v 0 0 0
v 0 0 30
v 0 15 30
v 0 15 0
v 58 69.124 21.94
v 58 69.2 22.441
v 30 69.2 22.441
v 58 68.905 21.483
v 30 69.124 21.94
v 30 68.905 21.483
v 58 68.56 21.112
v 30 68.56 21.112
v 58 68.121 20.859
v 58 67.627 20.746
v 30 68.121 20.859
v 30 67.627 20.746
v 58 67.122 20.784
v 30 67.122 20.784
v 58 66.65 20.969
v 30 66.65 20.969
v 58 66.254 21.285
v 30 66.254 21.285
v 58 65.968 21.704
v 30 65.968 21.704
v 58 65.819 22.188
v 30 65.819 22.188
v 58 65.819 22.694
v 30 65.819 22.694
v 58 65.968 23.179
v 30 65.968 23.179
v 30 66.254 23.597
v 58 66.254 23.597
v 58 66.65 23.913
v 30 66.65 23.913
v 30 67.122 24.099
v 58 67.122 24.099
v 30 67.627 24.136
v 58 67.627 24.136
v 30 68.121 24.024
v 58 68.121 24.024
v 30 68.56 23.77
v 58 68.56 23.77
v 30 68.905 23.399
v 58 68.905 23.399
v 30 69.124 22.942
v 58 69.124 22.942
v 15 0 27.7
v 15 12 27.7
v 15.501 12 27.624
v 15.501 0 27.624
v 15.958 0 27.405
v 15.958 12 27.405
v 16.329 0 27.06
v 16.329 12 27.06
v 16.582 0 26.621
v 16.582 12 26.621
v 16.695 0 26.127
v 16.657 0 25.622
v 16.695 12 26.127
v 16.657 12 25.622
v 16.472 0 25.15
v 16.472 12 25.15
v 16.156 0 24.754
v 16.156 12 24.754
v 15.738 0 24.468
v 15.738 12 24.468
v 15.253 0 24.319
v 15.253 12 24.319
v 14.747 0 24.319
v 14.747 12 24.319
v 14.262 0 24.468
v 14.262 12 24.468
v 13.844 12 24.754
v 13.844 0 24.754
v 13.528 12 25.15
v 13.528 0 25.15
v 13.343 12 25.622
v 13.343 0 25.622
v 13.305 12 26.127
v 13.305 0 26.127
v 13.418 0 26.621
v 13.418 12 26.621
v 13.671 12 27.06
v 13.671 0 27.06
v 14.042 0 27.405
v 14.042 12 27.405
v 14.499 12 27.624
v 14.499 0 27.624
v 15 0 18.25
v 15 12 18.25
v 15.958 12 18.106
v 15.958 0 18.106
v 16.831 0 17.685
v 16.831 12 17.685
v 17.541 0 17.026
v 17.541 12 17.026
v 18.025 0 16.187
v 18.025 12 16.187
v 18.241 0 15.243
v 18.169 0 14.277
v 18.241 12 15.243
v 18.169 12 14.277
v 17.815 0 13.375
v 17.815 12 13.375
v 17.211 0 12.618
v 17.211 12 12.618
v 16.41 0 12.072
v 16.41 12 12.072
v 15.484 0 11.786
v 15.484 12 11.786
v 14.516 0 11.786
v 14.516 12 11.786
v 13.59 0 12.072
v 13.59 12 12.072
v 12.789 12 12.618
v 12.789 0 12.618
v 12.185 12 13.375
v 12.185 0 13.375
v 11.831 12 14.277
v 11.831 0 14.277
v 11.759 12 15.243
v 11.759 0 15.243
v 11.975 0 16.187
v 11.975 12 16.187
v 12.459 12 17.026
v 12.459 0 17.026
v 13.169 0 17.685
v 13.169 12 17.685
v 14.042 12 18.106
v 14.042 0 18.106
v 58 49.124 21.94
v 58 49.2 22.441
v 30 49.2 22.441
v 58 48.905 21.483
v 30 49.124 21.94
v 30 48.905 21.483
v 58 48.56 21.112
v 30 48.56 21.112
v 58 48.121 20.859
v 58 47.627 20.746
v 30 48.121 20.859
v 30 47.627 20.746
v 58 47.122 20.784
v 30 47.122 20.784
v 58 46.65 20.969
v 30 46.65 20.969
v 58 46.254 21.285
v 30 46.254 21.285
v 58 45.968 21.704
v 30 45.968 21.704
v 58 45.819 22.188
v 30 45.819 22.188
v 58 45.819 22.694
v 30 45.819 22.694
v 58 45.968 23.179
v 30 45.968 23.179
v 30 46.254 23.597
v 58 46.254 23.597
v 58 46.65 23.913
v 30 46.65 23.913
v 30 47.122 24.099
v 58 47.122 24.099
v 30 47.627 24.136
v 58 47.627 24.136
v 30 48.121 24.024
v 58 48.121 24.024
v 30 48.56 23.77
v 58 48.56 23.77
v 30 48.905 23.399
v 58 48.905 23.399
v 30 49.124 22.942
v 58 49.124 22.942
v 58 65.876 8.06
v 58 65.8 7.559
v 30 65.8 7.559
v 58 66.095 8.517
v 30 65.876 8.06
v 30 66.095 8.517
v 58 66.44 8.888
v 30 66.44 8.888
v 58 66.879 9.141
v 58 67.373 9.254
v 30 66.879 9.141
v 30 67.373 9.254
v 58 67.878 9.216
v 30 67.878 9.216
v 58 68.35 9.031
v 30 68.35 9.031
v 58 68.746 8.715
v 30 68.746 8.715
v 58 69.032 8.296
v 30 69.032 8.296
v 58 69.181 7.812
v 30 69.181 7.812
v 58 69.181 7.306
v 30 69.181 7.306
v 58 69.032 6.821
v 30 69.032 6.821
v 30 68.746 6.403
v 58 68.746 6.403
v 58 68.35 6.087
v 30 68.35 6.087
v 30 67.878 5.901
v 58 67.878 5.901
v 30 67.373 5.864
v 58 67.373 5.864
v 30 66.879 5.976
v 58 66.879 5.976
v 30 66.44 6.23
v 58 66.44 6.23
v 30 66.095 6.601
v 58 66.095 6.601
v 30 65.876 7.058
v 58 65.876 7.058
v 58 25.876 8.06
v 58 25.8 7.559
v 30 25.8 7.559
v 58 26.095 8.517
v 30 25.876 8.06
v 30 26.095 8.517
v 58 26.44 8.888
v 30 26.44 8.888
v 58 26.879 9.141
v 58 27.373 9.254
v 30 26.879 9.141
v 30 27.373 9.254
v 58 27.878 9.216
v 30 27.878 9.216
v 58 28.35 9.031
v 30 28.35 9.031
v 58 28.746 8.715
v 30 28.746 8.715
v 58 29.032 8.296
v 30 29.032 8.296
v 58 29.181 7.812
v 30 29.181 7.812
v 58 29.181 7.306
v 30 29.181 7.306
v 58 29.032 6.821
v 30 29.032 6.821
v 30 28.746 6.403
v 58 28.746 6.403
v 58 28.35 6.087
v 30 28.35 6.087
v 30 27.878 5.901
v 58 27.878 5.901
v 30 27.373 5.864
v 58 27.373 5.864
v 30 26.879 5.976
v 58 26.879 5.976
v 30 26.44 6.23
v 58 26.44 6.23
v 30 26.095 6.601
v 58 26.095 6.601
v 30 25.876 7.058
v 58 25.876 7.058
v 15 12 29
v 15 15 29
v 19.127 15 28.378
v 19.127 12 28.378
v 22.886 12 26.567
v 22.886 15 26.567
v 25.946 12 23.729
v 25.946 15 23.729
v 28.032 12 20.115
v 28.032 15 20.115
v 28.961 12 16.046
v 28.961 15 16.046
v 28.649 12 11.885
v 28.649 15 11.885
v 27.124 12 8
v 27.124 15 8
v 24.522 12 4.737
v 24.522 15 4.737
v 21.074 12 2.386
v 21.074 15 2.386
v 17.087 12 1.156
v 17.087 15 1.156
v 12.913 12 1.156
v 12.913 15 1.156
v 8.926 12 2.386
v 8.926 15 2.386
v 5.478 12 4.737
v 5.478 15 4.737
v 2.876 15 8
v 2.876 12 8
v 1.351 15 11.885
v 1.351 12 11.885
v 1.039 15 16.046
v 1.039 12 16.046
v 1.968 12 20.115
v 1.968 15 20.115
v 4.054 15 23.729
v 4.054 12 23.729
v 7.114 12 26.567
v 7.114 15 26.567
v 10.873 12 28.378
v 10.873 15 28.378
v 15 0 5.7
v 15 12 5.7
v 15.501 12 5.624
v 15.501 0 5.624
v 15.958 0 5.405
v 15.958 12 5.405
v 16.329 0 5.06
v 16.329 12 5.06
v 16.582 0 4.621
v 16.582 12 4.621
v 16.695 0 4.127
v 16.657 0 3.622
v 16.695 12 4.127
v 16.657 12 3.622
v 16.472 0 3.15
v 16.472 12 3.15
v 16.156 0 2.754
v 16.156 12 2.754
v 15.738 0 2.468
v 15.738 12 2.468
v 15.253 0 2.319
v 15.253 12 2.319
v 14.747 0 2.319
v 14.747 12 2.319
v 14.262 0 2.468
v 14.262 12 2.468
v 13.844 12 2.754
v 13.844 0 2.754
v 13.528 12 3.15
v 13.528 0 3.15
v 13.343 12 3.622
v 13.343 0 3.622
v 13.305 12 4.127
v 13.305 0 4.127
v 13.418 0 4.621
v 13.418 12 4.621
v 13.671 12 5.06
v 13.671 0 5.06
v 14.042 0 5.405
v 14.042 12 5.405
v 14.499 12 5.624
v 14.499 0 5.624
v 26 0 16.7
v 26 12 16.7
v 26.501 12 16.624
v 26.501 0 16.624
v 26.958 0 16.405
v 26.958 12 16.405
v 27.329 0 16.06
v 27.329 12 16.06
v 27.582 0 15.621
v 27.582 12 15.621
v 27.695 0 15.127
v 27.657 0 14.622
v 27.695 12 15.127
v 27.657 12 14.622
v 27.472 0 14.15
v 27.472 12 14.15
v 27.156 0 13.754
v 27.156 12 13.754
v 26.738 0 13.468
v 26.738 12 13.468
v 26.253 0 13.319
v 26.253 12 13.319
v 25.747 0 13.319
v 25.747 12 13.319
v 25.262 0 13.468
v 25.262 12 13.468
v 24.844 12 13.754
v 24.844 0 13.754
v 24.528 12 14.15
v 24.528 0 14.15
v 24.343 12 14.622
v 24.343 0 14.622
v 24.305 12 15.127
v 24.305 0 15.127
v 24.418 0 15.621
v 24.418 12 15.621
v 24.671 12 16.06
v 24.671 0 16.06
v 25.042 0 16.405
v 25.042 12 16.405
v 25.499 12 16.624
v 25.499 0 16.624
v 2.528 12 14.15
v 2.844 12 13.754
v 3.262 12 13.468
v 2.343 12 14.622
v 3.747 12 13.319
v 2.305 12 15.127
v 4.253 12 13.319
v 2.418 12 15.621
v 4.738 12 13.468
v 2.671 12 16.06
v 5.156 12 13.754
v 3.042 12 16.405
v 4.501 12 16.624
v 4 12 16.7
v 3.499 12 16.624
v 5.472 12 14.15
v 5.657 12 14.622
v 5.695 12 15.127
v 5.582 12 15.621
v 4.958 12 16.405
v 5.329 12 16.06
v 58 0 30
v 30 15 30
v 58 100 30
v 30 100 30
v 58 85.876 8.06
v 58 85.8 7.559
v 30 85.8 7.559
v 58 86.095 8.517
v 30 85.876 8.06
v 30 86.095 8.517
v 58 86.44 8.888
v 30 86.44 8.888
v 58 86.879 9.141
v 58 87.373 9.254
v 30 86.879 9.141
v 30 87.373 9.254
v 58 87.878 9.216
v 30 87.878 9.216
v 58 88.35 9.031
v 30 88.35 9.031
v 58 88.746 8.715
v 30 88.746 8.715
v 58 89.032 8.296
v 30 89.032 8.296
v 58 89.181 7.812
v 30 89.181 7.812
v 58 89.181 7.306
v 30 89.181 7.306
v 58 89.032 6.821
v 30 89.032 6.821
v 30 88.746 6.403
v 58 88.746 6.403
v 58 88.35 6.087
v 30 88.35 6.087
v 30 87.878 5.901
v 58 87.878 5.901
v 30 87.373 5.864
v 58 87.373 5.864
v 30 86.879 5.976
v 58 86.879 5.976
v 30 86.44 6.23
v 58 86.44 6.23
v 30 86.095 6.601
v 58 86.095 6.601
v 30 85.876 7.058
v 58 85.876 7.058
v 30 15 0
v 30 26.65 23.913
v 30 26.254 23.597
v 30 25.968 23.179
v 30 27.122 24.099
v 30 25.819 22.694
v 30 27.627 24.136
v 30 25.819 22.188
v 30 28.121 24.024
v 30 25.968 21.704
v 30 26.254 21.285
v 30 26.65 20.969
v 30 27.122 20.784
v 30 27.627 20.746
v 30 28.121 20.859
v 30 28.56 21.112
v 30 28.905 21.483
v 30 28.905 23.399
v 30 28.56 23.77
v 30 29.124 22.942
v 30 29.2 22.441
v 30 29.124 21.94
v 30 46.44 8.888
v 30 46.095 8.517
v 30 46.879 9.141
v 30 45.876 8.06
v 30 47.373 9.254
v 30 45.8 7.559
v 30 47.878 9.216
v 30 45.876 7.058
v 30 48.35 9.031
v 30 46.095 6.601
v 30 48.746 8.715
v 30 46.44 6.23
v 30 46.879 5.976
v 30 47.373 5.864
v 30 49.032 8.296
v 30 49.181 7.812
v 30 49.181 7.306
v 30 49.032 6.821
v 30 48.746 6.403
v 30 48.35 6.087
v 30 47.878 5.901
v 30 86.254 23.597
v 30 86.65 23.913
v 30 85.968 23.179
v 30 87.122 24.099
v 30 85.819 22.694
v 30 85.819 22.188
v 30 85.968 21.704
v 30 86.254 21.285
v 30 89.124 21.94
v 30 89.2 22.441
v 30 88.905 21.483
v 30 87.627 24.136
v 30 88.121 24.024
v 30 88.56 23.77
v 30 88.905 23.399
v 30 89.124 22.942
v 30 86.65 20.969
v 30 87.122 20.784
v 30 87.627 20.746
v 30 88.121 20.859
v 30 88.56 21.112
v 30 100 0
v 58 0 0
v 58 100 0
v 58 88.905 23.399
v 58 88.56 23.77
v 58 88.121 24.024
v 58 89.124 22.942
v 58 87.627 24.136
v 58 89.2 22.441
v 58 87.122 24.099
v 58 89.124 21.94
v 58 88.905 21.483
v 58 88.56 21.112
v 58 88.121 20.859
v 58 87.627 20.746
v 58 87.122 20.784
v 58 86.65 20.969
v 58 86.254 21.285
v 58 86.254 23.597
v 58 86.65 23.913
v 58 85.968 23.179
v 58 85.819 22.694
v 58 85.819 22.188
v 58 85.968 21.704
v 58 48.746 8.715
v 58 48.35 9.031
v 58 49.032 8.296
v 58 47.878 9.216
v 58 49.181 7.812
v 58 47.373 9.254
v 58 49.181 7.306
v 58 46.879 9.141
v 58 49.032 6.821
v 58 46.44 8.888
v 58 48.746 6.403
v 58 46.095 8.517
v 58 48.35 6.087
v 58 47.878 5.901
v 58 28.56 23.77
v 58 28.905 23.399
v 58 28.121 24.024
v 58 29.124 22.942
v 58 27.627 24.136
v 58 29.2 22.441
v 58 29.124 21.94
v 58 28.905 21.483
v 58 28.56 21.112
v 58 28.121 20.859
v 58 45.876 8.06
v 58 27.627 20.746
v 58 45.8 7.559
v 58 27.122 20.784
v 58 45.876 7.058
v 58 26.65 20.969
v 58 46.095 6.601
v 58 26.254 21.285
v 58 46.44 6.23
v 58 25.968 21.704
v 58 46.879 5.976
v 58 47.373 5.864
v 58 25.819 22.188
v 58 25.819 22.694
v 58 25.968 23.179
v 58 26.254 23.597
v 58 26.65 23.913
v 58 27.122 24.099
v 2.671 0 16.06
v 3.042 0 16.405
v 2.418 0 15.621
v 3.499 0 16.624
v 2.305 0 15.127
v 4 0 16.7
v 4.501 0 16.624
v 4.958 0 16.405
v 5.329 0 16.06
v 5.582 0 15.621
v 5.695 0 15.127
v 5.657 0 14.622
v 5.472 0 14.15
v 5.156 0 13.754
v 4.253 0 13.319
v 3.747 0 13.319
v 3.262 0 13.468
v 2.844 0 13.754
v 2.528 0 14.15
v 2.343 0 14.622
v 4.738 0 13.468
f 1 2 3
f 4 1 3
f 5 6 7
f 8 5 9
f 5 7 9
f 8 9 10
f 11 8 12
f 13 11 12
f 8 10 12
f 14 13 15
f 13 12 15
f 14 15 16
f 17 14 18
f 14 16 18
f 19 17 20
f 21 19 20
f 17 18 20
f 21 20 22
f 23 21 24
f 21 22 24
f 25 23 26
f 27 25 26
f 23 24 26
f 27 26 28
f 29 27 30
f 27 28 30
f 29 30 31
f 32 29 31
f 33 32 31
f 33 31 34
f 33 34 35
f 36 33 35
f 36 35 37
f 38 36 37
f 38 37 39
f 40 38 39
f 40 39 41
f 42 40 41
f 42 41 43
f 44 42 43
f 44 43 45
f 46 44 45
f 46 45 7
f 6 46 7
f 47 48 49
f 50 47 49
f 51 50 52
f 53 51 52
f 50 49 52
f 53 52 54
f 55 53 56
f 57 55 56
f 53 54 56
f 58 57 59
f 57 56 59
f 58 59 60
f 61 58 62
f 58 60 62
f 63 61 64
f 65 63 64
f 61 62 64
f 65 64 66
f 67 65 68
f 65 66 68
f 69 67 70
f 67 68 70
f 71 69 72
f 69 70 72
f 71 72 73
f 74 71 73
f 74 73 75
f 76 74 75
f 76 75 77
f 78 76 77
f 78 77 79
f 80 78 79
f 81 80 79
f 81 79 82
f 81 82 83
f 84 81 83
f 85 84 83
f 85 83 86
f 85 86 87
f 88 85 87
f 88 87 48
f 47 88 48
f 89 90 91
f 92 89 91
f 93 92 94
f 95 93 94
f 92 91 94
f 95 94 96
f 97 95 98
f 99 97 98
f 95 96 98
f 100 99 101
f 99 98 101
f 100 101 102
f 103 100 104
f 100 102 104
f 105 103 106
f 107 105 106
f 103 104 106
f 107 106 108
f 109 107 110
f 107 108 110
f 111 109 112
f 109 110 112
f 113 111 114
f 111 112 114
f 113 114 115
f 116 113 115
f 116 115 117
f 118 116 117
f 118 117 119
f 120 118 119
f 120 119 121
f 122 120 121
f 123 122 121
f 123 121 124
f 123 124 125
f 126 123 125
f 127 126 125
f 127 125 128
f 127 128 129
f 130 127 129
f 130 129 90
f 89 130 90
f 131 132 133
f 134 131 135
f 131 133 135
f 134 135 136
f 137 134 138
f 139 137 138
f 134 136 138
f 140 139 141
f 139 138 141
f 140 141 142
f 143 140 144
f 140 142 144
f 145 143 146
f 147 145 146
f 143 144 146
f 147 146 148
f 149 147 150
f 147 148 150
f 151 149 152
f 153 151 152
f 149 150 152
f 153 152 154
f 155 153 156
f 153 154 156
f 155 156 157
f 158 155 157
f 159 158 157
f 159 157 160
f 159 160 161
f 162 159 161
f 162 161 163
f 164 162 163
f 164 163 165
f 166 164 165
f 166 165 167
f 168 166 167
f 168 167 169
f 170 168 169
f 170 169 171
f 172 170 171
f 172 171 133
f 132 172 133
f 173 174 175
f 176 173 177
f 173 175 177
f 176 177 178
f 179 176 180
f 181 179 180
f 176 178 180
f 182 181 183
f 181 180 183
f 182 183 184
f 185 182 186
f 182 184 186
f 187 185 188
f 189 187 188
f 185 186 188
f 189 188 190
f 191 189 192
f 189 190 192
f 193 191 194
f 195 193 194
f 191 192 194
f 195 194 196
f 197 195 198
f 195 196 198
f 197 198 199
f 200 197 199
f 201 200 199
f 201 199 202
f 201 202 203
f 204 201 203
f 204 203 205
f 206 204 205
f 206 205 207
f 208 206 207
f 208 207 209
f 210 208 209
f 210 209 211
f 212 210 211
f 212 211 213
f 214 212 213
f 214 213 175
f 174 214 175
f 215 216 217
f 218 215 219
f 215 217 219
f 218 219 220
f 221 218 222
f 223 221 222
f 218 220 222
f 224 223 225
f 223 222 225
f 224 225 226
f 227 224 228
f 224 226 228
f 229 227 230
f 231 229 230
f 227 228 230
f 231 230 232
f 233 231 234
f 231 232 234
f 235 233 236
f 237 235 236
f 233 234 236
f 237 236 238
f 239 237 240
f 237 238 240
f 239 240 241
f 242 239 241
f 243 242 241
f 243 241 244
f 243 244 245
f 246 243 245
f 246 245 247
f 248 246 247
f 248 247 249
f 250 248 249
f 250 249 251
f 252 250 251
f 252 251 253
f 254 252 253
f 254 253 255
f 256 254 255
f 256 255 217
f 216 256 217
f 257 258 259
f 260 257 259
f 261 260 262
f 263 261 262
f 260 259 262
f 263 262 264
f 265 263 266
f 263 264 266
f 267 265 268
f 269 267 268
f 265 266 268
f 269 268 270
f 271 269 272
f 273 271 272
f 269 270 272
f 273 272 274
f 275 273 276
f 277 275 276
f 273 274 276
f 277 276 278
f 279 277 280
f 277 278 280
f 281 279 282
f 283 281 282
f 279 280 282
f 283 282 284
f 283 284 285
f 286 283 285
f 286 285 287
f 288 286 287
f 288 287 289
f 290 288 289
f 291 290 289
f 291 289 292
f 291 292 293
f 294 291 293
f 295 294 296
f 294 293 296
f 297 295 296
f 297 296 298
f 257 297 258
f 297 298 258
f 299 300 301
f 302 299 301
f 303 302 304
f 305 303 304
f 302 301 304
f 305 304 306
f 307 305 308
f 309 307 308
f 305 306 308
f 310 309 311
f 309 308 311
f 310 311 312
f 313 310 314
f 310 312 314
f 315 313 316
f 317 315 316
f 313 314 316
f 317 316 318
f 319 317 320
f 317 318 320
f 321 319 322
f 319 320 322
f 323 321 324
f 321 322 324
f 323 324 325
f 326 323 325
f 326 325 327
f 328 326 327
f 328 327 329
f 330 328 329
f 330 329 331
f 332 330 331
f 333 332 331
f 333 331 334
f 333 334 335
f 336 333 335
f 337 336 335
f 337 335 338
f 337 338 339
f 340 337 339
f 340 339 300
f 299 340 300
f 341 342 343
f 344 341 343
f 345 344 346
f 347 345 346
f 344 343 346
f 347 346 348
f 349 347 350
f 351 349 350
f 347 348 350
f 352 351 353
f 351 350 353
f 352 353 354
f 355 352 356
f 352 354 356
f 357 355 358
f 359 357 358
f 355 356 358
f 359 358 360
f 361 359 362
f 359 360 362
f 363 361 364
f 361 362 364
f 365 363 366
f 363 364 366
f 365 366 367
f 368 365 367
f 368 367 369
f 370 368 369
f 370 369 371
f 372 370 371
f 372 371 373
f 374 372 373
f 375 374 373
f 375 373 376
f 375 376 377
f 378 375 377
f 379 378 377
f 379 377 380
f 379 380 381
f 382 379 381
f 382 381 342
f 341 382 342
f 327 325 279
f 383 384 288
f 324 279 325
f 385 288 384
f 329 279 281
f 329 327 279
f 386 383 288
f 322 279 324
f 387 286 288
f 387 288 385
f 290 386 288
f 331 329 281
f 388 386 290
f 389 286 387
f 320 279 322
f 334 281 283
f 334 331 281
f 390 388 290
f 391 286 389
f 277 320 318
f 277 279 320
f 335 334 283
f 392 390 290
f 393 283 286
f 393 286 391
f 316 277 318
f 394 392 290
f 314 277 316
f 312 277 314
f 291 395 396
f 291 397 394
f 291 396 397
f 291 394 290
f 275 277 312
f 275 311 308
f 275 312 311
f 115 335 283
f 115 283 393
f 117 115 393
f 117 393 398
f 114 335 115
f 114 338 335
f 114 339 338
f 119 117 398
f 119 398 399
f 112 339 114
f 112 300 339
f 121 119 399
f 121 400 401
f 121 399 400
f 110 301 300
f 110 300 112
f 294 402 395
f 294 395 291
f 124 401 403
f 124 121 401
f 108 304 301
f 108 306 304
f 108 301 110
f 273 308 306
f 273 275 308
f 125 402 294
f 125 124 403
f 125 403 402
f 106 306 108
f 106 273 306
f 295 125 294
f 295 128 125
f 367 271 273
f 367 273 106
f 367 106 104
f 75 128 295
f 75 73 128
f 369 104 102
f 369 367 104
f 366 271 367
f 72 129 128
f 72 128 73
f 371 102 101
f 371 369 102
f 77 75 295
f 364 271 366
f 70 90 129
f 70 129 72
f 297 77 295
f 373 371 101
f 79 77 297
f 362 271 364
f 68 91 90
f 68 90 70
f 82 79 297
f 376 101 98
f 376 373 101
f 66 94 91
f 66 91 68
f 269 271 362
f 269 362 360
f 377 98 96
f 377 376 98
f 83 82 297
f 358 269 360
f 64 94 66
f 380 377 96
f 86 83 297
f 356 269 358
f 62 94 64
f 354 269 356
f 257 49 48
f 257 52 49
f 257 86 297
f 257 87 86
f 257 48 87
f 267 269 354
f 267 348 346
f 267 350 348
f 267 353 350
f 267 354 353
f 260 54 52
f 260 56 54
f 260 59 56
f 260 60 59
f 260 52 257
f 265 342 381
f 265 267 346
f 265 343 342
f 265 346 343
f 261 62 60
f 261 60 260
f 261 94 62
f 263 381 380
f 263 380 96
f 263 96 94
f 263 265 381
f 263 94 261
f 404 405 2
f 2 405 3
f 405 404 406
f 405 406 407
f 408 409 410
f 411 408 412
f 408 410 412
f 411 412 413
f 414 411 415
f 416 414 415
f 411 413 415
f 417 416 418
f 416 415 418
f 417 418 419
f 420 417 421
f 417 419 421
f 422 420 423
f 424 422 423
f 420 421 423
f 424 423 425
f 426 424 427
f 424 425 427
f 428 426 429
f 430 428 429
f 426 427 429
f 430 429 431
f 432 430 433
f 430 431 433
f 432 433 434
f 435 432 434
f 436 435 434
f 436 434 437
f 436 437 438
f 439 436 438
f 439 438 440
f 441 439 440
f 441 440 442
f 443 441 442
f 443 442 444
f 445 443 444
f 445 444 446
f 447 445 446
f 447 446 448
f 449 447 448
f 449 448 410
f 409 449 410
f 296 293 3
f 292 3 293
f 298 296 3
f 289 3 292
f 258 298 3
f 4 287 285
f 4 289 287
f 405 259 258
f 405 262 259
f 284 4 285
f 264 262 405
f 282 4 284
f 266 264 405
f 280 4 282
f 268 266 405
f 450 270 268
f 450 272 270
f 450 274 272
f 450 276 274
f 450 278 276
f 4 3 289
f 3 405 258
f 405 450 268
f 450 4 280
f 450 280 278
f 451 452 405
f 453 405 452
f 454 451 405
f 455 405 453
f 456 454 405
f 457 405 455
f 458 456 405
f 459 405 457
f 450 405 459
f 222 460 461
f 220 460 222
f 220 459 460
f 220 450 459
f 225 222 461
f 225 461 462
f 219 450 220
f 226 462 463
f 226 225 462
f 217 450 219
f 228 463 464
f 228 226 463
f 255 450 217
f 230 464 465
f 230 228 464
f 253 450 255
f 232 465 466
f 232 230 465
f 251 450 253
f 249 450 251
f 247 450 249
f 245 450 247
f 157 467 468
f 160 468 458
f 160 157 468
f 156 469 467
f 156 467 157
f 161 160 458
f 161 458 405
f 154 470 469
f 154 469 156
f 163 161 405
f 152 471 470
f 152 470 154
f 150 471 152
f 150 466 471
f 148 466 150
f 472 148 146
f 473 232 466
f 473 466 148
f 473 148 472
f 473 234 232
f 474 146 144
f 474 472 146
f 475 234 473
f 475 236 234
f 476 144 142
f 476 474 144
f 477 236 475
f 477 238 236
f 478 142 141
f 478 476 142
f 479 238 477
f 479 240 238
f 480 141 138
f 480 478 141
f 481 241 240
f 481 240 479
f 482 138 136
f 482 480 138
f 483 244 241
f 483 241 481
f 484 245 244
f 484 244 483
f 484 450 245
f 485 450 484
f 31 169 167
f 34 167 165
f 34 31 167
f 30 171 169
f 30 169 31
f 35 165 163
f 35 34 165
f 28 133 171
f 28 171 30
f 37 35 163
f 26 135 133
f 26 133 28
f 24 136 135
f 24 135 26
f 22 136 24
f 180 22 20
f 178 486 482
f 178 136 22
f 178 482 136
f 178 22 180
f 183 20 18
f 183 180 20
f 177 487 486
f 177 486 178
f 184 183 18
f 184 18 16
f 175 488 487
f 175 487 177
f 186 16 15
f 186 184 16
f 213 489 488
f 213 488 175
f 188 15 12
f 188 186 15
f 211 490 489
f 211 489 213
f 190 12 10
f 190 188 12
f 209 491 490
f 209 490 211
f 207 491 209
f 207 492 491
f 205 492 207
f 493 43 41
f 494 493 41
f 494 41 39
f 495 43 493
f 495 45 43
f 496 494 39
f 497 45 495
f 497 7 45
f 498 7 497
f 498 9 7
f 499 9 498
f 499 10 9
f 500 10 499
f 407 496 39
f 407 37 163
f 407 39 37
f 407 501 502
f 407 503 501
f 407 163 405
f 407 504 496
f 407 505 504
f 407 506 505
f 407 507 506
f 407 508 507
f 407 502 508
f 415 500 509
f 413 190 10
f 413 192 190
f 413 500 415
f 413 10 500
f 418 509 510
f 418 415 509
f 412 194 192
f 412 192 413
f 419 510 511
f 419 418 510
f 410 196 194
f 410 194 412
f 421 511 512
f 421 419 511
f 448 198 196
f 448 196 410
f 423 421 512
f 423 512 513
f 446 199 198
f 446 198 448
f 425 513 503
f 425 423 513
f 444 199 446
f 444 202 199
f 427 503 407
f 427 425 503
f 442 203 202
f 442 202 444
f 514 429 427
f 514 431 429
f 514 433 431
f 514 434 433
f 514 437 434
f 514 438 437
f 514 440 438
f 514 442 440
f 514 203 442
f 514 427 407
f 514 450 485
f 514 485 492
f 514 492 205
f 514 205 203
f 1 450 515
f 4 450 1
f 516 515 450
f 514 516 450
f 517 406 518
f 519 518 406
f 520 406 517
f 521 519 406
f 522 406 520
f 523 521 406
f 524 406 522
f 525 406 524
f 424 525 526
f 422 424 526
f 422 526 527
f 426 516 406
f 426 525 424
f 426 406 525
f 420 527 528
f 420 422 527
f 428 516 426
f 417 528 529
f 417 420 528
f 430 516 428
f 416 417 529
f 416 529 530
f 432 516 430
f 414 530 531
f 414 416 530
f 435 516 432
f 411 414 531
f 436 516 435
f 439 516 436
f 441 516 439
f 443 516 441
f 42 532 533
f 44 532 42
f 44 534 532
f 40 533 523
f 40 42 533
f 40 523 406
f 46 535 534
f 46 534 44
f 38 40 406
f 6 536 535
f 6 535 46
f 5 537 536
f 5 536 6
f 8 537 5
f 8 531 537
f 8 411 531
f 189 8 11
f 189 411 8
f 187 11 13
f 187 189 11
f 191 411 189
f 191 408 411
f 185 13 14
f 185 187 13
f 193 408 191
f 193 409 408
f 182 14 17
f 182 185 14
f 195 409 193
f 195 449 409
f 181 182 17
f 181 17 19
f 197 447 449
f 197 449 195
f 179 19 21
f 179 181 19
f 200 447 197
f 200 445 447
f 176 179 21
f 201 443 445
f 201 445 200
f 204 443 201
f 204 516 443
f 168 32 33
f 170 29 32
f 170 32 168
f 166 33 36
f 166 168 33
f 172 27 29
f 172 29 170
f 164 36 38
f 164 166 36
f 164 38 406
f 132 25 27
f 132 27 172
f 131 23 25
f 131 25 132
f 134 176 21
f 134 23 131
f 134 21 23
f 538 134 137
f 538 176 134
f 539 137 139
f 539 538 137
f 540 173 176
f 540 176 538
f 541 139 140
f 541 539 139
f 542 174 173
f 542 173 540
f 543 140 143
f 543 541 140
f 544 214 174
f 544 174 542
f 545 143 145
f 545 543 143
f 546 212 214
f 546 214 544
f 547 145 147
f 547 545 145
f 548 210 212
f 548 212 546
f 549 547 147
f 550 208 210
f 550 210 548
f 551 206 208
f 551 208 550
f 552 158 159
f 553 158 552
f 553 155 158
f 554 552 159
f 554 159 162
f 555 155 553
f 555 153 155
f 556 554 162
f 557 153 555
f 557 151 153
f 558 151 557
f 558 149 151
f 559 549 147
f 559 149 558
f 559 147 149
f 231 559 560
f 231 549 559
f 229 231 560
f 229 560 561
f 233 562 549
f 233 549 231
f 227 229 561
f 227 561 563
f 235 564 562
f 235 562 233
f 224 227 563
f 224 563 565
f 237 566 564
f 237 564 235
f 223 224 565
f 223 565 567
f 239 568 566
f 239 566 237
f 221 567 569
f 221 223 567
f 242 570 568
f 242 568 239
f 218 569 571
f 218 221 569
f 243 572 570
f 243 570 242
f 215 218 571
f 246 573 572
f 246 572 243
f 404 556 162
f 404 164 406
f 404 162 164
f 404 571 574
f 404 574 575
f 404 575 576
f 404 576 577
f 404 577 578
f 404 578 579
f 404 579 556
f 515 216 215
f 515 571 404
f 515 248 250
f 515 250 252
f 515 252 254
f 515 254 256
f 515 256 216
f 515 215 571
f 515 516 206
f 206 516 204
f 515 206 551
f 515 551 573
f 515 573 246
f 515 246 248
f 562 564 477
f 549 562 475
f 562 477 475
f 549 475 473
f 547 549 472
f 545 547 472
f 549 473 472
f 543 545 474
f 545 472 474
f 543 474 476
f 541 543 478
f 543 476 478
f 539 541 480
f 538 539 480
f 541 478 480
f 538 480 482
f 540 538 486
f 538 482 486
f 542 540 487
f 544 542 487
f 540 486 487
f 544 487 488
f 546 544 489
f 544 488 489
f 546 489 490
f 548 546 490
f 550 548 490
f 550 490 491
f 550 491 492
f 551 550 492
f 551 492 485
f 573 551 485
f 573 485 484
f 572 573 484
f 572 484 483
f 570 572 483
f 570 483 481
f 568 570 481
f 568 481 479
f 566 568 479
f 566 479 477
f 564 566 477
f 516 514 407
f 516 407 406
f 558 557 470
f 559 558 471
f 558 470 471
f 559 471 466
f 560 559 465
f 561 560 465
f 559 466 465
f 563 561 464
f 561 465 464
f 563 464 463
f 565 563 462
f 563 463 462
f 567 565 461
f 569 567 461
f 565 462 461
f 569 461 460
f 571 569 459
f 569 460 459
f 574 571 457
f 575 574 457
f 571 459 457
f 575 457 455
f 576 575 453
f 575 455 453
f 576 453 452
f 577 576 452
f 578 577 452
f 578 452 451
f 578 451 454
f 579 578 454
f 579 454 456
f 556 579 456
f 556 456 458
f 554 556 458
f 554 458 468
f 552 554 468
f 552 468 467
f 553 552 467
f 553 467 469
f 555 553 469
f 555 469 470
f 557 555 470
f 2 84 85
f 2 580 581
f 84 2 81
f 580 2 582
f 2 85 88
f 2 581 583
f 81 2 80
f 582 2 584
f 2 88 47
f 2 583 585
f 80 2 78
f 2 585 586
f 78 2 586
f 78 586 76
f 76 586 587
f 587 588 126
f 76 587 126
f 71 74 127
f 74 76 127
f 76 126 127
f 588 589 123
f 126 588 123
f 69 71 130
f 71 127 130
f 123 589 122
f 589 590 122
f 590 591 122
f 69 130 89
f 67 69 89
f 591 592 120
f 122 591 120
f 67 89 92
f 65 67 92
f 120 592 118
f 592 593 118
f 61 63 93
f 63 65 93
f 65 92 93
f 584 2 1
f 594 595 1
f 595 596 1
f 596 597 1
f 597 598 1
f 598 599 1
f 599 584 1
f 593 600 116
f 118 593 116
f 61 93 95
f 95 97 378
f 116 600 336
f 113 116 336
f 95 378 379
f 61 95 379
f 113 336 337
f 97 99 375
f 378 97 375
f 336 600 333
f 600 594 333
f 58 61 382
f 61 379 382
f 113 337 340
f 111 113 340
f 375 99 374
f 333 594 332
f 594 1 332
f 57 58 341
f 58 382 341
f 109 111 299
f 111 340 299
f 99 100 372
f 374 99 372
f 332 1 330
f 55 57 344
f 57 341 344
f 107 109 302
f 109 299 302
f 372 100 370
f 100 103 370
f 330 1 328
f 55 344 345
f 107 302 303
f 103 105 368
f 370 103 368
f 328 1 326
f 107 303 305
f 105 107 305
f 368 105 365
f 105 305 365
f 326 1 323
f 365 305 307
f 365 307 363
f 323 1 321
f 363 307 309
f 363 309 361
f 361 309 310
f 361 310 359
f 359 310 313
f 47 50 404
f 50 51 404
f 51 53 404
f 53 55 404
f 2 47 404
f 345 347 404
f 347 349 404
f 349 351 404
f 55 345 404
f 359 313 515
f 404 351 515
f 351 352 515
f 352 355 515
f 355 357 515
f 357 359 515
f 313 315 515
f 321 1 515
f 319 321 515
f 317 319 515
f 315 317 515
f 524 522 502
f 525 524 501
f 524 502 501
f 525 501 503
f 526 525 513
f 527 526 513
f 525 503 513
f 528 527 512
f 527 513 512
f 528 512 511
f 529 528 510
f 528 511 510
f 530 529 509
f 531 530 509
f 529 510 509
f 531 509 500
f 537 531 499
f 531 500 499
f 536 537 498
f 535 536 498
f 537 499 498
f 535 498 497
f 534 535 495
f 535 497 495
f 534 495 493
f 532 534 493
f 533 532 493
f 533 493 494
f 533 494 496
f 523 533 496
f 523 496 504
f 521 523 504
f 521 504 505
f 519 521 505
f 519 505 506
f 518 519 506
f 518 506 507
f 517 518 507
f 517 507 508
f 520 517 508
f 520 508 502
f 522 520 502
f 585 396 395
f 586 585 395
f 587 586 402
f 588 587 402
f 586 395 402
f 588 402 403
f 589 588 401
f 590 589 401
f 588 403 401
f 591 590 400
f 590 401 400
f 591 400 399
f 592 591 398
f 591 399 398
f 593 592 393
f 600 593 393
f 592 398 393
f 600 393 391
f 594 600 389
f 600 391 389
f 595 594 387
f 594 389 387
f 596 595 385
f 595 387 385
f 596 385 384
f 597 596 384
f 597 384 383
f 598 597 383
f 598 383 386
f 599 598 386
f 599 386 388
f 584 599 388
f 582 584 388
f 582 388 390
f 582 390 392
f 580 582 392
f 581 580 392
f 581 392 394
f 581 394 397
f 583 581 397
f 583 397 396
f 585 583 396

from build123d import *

# Parameters (mm, degrees)
BOSS_EXTRUDE1_DEPTH = 30
SKETCH3_R           = 14
CUT_EXTRUDE1_DEPTH  = 3
SKETCH4_R           = 1.7
SKETCH4_R_2         = 3.25
CUT_EXTRUDE2_DEPTH  = 110.581020254
SKETCH5_R           = 1.7
CUT_EXTRUDE3_DEPTH  = 109.627804912


with BuildPart() as part:
    # Sketch2 → Boss-Extrude1 (new body)
    with BuildSketch(Plane.XY):
        Polygon((0, 0), (0, 15), (30, 15), (30, 100), (58, 100), (58, 0), (30, 0), align=None)
    extrude(amount=BOSS_EXTRUDE1_DEPTH)

    # Sketch3 → Cut-Extrude1 (cut)
    with BuildSketch(Plane(origin=(0, 15, 0), x_dir=(1, 0, 0), z_dir=(0, 1, 0))):
        with Locations(Location((15, -15, 0), (0, 0, 270))):
            Circle(SKETCH3_R)
    extrude(amount=-CUT_EXTRUDE1_DEPTH, mode=Mode.SUBTRACT)

    # Sketch4 → Cut-Extrude2 (cut, through all)
    with BuildSketch(Plane(origin=(0, 12, 0), x_dir=(1, 0, 0), z_dir=(0, 1, 0))):
        with Locations(Location((15, -4, 0), (0, 0, 270))):
            Circle(SKETCH4_R)
        with Locations(Location((26, -15, 0), (0, 0, 270))):
            Circle(SKETCH4_R)
        with Locations(Location((15, -26, 0), (0, 0, 270))):
            Circle(SKETCH4_R)
        with Locations(Location((4, -15, 0), (0, 0, 270))):
            Circle(SKETCH4_R)
        with Locations(Location((15, -15, 0), (0, 0, 270))):
            Circle(SKETCH4_R_2)
    extrude(amount=-CUT_EXTRUDE2_DEPTH, mode=Mode.SUBTRACT)

    # Sketch5 → Cut-Extrude3 (cut, through all)
    with BuildSketch(Plane.ZY.offset(-30)):
        with Locations(Location((7.558876463, 27.5, 0), (0, 0, 270))):
            Circle(SKETCH5_R)
        with Locations(Location((7.558876463, 47.5, 0), (0, 0, 270))):
            Circle(SKETCH5_R)
        with Locations(Location((7.558876463, 67.5, 0), (0, 0, 270))):
            Circle(SKETCH5_R)
        with Locations(Location((7.558876463, 87.5, 0), (0, 0, 270))):
            Circle(SKETCH5_R)
        with Locations(Location((22.441123537, 27.5, 0), (0, 0, 90))):
            Circle(SKETCH5_R)
        with Locations(Location((22.441123537, 47.5, 0), (0, 0, 90))):
            Circle(SKETCH5_R)
        with Locations(Location((22.441123537, 67.5, 0), (0, 0, 90))):
            Circle(SKETCH5_R)
        with Locations(Location((22.441123537, 87.5, 0), (0, 0, 90))):
            Circle(SKETCH5_R)
    extrude(amount=-CUT_EXTRUDE3_DEPTH, mode=Mode.SUBTRACT)


solid = part.part
